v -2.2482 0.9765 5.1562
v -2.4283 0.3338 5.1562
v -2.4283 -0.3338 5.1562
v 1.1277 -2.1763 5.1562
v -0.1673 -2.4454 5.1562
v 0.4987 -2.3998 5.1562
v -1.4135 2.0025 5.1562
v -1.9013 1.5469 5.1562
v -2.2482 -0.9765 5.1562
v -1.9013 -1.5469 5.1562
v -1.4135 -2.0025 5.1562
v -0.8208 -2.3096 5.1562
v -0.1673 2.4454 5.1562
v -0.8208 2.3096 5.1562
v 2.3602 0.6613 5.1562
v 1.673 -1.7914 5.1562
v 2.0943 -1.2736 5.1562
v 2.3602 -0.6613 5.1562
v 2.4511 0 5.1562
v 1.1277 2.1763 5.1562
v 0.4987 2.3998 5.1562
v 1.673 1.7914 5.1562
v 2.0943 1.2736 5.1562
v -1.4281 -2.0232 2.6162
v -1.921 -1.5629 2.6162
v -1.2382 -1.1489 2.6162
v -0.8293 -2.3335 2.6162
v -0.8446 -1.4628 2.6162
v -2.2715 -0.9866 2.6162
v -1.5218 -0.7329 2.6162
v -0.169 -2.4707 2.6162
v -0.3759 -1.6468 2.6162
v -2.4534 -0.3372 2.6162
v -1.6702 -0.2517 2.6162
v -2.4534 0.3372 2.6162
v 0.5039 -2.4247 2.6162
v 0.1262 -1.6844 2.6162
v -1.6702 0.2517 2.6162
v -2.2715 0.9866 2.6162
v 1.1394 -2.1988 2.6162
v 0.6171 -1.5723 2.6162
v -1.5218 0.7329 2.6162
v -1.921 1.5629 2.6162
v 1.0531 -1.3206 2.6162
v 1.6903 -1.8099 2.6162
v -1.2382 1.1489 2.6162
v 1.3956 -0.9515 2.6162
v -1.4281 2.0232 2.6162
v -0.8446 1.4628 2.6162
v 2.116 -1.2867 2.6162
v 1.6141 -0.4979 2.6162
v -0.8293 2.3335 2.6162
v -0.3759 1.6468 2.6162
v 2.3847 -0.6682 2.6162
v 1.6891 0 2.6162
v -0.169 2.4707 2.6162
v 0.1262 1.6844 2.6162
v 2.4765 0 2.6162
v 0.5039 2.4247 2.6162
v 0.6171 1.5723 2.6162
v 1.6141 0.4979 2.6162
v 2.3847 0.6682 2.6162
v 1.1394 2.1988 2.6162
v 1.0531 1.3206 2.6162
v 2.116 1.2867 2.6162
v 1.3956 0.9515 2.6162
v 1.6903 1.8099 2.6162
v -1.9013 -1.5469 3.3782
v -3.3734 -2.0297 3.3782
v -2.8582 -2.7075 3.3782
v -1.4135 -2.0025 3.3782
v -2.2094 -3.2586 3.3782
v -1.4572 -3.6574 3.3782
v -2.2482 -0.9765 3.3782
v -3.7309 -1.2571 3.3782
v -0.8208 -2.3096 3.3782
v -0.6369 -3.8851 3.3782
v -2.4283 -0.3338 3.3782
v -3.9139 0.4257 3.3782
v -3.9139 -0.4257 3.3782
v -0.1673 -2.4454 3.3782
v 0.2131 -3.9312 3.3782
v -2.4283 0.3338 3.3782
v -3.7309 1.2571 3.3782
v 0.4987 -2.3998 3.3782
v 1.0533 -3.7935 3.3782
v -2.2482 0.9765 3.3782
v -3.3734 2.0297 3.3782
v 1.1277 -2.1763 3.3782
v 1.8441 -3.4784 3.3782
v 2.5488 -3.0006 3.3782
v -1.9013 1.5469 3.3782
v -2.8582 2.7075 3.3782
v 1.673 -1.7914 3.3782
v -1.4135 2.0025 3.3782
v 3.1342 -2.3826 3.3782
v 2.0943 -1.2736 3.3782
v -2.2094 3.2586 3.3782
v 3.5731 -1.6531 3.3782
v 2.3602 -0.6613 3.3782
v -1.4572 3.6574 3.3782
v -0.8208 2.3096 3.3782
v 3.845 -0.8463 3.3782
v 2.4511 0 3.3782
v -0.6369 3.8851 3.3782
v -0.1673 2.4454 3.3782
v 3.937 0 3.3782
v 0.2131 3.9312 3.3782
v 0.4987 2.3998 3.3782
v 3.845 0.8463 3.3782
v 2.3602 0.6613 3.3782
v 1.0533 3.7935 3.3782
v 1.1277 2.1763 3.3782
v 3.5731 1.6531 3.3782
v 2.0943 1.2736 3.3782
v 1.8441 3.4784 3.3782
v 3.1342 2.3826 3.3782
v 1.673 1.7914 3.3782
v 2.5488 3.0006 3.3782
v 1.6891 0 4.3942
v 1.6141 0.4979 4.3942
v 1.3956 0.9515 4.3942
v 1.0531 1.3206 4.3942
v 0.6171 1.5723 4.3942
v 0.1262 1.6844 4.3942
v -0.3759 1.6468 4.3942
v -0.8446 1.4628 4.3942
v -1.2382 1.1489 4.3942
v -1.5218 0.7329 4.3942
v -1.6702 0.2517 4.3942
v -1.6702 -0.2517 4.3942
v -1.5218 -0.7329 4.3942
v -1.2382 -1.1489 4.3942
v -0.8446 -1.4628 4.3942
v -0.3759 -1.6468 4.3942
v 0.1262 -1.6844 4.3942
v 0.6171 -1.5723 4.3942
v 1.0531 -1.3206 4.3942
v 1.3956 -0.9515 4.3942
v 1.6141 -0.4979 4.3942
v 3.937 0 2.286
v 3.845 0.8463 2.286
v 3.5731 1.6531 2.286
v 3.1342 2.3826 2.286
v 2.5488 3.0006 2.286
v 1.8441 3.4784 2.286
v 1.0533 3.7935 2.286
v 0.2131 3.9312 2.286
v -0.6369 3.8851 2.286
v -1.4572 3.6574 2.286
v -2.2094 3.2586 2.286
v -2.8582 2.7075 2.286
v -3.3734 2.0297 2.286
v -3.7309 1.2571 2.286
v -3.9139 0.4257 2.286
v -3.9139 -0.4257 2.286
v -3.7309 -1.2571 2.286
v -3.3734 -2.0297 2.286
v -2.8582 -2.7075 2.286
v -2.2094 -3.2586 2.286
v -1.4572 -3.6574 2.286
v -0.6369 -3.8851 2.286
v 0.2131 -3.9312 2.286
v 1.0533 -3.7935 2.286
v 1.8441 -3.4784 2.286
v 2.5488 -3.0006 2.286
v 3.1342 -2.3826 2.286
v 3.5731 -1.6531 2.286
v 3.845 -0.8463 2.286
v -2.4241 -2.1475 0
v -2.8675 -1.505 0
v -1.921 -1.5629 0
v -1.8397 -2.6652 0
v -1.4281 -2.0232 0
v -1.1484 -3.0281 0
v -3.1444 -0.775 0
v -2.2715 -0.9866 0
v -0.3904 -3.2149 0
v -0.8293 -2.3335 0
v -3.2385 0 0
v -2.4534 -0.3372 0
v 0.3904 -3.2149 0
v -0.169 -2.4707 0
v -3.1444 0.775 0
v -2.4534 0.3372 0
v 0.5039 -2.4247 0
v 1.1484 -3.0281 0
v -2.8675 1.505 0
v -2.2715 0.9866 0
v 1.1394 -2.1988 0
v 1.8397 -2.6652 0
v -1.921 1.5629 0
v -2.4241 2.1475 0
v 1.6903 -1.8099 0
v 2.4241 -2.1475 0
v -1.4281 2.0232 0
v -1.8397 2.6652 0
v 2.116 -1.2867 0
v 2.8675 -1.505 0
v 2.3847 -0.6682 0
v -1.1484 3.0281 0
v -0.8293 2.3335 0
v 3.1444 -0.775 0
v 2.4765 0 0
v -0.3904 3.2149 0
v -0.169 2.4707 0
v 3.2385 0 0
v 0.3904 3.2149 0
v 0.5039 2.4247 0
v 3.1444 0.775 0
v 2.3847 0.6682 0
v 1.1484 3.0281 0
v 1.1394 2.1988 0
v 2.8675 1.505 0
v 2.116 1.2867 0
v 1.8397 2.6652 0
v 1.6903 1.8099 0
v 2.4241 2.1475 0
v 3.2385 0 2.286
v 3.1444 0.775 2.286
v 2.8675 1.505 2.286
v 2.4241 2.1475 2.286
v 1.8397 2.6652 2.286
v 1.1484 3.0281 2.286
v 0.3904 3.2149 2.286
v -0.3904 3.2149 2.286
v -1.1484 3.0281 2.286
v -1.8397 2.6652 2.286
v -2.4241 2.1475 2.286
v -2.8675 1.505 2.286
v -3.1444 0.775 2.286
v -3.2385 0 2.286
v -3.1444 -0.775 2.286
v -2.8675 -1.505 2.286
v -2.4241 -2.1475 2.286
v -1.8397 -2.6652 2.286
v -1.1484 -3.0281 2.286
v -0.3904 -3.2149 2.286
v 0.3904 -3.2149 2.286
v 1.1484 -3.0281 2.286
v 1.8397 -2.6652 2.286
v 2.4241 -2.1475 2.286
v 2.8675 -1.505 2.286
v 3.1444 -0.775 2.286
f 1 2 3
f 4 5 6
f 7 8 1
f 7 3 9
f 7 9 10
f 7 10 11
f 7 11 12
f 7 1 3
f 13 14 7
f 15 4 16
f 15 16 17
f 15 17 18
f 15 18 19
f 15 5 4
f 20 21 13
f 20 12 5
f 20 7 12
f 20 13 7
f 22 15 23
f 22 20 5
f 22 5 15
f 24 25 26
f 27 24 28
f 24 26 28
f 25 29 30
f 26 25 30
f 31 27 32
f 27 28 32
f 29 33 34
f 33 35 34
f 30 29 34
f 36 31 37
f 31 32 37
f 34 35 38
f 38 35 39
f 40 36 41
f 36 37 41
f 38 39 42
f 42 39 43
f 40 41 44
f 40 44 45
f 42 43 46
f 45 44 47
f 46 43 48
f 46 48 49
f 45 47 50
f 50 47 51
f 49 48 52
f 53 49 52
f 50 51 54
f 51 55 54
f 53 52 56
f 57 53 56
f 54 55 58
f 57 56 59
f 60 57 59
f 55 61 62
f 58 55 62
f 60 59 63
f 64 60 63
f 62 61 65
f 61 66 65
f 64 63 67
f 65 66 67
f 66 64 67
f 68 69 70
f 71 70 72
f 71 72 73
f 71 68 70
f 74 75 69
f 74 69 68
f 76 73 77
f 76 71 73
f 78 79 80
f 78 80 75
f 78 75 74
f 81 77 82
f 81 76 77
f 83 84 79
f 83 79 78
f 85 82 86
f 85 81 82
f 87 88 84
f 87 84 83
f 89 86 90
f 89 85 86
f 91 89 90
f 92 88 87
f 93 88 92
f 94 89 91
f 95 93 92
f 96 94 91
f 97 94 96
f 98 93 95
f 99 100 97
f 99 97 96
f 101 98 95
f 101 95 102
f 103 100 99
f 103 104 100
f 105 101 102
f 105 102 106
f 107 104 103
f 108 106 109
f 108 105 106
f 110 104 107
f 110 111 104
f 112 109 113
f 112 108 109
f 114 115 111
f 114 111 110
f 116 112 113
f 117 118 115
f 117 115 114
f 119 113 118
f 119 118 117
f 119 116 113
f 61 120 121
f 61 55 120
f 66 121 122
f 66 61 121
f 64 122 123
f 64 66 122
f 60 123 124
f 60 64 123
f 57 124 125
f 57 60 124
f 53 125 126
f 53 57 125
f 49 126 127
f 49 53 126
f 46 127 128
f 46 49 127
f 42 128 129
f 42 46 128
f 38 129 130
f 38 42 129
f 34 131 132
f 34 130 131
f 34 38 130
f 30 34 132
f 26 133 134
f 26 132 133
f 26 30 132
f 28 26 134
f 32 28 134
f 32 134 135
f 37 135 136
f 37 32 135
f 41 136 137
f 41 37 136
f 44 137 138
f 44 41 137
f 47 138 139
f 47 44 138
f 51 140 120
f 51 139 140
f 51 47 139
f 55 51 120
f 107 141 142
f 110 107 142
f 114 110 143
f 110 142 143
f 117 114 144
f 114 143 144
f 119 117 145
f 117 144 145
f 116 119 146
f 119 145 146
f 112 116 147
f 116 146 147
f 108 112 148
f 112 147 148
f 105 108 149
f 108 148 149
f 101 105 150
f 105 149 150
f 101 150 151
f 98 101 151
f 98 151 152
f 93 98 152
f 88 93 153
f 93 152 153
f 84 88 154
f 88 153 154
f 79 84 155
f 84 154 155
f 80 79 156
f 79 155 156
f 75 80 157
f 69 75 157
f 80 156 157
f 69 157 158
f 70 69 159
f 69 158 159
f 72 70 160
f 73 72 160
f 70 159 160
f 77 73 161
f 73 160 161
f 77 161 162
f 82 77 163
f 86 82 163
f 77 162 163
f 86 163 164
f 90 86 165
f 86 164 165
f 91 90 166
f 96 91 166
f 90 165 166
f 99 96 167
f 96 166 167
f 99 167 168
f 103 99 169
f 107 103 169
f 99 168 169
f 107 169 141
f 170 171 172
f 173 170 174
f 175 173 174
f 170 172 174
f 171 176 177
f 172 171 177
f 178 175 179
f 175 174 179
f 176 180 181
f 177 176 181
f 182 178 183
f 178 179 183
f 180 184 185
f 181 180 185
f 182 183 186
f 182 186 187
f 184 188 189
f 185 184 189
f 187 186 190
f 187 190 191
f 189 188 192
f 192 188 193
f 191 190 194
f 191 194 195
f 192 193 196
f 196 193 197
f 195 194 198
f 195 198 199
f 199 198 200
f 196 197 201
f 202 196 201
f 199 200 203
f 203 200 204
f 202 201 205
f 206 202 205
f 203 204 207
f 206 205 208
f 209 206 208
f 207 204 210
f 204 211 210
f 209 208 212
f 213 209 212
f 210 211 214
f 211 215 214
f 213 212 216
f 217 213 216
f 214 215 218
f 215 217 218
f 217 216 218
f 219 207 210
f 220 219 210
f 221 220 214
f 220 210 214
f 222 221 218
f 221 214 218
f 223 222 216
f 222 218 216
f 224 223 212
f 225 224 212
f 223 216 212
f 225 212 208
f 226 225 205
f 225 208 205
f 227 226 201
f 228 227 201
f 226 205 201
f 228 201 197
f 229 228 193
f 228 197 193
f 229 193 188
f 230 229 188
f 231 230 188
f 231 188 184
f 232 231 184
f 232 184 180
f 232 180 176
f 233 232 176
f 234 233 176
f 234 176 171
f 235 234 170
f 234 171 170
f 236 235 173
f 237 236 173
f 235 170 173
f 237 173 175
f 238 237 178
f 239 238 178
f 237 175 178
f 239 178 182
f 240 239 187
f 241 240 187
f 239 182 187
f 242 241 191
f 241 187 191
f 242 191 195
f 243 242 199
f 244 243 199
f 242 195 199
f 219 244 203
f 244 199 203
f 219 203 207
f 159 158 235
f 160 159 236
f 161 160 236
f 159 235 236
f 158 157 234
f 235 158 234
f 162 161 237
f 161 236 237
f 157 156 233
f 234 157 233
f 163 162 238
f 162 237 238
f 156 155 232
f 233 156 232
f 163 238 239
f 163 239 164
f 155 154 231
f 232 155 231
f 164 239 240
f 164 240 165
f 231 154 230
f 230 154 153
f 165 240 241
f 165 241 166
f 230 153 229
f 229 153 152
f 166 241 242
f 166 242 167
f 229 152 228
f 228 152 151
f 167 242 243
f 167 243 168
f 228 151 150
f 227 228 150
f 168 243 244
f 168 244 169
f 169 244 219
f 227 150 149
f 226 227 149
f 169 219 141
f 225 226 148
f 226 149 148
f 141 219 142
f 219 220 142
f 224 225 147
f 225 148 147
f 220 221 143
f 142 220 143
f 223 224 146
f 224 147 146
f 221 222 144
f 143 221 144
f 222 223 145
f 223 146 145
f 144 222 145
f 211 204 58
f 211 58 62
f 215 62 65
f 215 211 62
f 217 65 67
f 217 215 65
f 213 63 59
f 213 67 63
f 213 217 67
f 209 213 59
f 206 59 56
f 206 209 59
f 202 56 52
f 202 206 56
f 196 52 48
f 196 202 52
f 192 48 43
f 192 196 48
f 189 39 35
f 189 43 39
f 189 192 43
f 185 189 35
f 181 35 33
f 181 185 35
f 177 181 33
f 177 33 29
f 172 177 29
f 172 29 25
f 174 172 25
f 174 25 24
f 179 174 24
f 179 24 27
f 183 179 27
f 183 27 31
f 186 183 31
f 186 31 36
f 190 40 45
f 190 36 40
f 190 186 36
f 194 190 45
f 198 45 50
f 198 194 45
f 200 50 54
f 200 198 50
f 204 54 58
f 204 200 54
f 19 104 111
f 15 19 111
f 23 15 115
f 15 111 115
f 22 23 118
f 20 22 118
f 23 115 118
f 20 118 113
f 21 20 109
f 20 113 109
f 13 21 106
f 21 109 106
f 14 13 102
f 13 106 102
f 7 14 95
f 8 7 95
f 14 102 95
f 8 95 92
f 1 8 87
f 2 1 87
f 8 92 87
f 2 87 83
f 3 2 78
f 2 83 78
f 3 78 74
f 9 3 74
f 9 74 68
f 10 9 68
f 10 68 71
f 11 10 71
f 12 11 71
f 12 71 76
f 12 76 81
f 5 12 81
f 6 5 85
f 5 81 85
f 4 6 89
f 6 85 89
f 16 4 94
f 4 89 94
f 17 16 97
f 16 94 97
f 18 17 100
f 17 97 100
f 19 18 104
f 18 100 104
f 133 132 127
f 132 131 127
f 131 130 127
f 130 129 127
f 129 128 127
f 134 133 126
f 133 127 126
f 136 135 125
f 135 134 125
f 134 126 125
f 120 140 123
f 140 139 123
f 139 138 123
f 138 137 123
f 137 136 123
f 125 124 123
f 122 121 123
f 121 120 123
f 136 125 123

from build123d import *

# Parameters (mm, degrees)
F0_R     = 3.2385
F1_DEPTH = 2.286
F2_R     = 3.937
F3_DEPTH = 1.0922
F4_R     = 2.4511
F5_DEPTH = 1.778
F6_T     = -0.762


with BuildPart() as f1:
    # F0 (on Top) → F1 (new body)
    with BuildSketch(Plane.XY):
        Circle(F0_R)
    extrude(amount=F1_DEPTH)

    # F2 (on face) → F3 (join)
    with BuildSketch(Plane.XY.offset(2.286)):
        Circle(F2_R)
    extrude(amount=F3_DEPTH)

    # F4 (on face) → F5 (join)
    with BuildSketch(Plane.XY.offset(3.3782)):
        Circle(F4_R)
    extrude(amount=F5_DEPTH)

    # F6
    f6_openings = [f1.faces().sort_by_distance(p)[0] for p in [
        (0, 0, 0),
    ]]
    offset(amount=F6_T, openings=f6_openings, kind=Kind.INTERSECTION)


solid = f1.part
